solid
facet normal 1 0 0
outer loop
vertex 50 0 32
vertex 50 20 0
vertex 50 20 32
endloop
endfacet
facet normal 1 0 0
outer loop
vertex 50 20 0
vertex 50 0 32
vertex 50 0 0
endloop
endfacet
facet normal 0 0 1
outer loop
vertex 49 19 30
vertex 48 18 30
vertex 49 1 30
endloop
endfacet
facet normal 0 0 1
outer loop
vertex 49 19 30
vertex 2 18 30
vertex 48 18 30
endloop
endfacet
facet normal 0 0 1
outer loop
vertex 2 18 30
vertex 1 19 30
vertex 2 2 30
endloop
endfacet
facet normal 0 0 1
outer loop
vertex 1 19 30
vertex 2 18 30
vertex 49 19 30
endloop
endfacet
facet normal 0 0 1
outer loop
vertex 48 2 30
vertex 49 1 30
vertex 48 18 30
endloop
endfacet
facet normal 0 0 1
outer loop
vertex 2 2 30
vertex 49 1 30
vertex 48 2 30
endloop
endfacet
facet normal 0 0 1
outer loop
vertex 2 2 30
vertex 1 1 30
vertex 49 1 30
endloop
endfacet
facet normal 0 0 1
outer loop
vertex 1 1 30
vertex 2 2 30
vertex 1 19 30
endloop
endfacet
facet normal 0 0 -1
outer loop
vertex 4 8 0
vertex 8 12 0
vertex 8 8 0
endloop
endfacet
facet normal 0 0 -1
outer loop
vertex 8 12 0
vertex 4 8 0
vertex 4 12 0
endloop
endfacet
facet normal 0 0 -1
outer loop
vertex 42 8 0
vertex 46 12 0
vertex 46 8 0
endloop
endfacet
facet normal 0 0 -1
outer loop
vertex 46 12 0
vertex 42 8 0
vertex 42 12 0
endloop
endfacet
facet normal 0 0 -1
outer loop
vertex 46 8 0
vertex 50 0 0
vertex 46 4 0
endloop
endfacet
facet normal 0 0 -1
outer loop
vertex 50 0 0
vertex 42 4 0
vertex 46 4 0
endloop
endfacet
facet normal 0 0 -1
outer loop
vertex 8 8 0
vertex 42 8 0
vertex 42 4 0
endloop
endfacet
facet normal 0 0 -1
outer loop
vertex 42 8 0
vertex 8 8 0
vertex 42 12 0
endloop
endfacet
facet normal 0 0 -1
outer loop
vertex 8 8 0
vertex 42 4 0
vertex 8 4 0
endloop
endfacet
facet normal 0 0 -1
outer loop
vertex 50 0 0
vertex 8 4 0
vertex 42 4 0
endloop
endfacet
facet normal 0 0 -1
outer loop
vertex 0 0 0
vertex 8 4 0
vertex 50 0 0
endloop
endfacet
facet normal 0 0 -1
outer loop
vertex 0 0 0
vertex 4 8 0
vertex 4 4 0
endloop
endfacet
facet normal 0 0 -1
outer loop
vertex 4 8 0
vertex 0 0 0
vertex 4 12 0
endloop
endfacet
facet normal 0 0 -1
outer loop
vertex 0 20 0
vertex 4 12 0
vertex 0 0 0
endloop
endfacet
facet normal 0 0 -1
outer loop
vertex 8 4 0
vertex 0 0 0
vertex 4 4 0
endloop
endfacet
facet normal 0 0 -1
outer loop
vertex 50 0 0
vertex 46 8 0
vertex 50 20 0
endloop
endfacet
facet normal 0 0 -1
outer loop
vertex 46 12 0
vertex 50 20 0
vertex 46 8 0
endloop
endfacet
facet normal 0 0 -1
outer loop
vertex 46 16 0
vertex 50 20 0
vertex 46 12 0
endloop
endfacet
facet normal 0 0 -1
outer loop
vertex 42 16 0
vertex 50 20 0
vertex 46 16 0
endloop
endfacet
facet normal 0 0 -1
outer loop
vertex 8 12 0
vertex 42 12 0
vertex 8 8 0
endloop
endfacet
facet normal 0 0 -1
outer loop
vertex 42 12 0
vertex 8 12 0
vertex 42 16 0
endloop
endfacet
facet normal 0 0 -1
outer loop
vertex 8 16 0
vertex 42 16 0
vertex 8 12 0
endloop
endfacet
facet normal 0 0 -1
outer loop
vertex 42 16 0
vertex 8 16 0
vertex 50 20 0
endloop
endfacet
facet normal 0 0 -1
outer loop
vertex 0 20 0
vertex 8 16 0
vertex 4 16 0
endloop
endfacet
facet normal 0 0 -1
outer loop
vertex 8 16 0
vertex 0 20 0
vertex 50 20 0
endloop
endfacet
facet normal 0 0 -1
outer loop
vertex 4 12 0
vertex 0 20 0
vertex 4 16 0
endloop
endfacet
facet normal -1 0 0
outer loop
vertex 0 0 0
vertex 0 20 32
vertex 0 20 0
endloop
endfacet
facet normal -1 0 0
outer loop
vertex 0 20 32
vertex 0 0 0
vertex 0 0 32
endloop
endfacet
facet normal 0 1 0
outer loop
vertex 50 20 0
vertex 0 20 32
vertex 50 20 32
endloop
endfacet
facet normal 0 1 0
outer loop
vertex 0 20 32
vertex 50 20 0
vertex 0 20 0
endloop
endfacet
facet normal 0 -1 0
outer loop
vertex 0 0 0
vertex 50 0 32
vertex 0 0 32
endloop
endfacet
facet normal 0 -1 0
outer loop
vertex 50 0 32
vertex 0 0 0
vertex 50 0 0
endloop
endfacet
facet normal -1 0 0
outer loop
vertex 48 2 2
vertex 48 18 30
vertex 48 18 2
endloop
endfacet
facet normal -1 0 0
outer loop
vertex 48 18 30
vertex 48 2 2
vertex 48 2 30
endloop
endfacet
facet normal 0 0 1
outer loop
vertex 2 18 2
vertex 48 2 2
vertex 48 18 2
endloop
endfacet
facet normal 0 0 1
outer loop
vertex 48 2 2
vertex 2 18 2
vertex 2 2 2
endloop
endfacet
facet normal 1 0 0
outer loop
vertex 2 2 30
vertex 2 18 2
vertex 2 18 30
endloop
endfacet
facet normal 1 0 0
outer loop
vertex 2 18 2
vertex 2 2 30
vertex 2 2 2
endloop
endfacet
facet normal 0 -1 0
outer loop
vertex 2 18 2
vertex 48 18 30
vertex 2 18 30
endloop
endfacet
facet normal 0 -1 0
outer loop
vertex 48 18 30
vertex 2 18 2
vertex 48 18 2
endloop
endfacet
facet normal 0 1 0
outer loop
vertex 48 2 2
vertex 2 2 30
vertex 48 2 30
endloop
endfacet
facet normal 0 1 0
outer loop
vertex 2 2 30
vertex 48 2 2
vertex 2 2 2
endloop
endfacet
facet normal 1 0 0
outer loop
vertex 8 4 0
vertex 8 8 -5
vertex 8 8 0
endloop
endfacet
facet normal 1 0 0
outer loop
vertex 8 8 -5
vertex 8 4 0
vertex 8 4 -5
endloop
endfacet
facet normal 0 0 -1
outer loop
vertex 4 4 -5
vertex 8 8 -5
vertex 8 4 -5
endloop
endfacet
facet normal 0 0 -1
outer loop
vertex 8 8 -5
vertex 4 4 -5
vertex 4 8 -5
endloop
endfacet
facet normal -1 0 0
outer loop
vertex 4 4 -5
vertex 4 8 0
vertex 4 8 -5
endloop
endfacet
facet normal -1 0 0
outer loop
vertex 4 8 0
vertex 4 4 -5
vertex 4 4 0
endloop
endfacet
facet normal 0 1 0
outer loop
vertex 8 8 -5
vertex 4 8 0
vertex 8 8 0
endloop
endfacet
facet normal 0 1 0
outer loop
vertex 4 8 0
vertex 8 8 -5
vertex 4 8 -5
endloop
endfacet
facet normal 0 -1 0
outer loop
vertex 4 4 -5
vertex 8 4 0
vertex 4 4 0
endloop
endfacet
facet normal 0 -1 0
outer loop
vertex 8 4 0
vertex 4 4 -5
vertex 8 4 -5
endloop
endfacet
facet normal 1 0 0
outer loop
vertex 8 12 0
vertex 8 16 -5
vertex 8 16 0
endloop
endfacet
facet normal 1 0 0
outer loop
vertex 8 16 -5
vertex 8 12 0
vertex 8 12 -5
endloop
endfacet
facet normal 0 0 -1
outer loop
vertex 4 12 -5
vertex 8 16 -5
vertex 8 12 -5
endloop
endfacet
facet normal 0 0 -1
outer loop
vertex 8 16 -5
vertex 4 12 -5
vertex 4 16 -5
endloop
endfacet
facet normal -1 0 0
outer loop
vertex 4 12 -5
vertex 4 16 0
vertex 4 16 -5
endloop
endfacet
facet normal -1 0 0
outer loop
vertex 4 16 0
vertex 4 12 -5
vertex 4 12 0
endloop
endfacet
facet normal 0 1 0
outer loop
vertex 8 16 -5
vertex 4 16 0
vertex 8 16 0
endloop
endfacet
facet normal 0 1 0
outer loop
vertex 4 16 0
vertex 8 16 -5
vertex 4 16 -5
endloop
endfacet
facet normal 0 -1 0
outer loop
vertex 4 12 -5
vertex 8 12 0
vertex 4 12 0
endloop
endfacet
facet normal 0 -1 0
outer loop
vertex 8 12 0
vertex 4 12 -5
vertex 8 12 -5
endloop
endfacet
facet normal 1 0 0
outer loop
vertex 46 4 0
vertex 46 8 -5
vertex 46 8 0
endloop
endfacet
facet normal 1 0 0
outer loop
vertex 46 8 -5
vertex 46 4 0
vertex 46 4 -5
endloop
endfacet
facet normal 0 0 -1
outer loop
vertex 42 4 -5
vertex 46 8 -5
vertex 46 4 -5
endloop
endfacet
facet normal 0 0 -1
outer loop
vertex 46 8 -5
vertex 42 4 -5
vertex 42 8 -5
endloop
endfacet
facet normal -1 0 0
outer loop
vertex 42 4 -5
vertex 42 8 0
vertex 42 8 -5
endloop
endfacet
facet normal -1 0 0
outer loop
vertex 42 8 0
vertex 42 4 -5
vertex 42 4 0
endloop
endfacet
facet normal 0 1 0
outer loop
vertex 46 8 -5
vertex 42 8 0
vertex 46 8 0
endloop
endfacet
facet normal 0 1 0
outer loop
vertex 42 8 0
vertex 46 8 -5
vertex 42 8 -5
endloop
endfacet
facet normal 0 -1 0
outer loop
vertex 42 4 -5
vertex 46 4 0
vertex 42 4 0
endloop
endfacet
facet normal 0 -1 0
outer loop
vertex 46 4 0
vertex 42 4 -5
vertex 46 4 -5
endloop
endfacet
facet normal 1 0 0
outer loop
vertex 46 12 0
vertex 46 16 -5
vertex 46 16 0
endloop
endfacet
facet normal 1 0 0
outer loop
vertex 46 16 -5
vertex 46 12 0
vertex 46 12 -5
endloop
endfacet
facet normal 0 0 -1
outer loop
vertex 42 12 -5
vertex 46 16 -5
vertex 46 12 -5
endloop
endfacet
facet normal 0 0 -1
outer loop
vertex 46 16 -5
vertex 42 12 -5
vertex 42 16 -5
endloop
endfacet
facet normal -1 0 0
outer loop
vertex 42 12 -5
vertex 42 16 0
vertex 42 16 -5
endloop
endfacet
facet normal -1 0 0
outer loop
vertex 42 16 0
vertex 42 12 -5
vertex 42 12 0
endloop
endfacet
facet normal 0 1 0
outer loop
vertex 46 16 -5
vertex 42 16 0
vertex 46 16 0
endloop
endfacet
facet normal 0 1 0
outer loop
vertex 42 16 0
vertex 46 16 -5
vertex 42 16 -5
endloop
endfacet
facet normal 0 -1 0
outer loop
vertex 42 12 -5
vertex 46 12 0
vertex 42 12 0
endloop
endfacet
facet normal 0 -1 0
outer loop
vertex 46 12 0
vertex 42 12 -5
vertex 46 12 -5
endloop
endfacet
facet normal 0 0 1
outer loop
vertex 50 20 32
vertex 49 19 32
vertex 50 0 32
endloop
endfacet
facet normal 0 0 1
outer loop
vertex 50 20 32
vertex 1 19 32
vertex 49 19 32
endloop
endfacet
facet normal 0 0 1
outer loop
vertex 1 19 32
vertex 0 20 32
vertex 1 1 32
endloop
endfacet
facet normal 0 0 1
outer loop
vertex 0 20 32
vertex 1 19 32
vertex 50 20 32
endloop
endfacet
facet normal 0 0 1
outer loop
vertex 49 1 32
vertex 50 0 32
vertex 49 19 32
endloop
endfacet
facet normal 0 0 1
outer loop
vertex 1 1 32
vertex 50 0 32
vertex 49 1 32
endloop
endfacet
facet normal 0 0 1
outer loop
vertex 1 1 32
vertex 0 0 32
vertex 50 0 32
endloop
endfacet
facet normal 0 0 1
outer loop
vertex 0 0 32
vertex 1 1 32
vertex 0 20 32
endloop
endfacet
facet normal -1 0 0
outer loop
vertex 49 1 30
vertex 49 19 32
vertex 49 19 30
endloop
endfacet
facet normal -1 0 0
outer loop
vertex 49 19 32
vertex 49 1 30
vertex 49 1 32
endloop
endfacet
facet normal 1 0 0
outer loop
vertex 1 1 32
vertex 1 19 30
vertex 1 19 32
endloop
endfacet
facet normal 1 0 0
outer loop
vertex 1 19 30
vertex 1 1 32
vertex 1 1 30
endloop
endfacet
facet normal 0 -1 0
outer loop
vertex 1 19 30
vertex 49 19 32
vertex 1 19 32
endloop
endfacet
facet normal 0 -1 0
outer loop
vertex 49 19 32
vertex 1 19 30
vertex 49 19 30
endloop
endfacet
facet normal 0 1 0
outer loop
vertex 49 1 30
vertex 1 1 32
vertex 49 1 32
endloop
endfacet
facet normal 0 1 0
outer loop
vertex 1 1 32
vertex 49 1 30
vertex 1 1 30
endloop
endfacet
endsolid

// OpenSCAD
// Colored Box Example
// Demonstrates color parameter support in OpenSCAD Web Customizer

/* [Dimensions] */
width = 50; // [10:100] Box width (mm)
height = 30; // [10:100] Box height (mm)
depth = 20; // [10:100] Box depth (mm)
wall_thickness = 2; // [1:0.5:5] Wall thickness (mm)

/* [Appearance] */
box_color = "FF6B35"; // [color] Primary box color
accent_color = "004E89"; // [color] Accent color for details
use_colors = "yes"; // [yes, no] Use colors in preview

/* [Details] */
add_lid = "yes"; // [yes, no] Add a lid
add_feet = "yes"; // [yes, no] Add feet to bottom

// Module: Colored Box
// This demonstrates how color parameters work in OpenSCAD Web Customizer
// Colors are passed as RGB arrays [r, g, b] with values 0-255

module colored_box() {
    difference() {
        // Outer box
        if (use_colors == "yes") {
            color(box_color / 255)  // Convert RGB array to 0-1 range
            cube([width, depth, height]);
        } else {
            cube([width, depth, height]);
        }
        
        // Hollow interior
        translate([wall_thickness, wall_thickness, wall_thickness])
        cube([
            width - 2 * wall_thickness, 
            depth - 2 * wall_thickness, 
            height
        ]);
    }
    
    // Add feet if enabled
    if (add_feet == "yes") {
        foot_size = wall_thickness * 2;
        foot_height = 5;
        
        if (use_colors == "yes") {
            color(accent_color / 255)  // Accent color for feet
            for (x = [foot_size, width - foot_size * 2]) {
                for (y = [foot_size, depth - foot_size * 2]) {
                    translate([x, y, -foot_height])
                    cube([foot_size, foot_size, foot_height]);
                }
            }
        } else {
            for (x = [foot_size, width - foot_size * 2]) {
                for (y = [foot_size, depth - foot_size * 2]) {
                    translate([x, y, -foot_height])
                    cube([foot_size, foot_size, foot_height]);
                }
            }
        }
    }
    
    // Add lid if enabled
    if (add_lid == "yes") {
        lid_overlap = wall_thickness / 2;
        
        if (use_colors == "yes") {
            color(accent_color / 255)  // Accent color for lid
            translate([0, 0, height])
            difference() {
                cube([width, depth, wall_thickness]);
                translate([lid_overlap, lid_overlap, -1])
                cube([
                    width - 2 * lid_overlap, 
                    depth - 2 * lid_overlap, 
                    wall_thickness + 2
                ]);
            }
        } else {
            translate([0, 0, height])
            difference() {
                cube([width, depth, wall_thickness]);
                translate([lid_overlap, lid_overlap, -1])
                cube([
                    width - 2 * lid_overlap, 
                    depth - 2 * lid_overlap, 
                    wall_thickness + 2
                ]);
            }
        }
    }
}

// Render the box
colored_box();

// Instructions:
// 1. Click the color boxes to select your preferred colors
// 2. Or enter hex codes directly (RRGGBB format)
// 3. Adjust dimensions using the sliders
// 4. Toggle features with yes/no switches
// 5. Click "Generate STL" to create your customized box
